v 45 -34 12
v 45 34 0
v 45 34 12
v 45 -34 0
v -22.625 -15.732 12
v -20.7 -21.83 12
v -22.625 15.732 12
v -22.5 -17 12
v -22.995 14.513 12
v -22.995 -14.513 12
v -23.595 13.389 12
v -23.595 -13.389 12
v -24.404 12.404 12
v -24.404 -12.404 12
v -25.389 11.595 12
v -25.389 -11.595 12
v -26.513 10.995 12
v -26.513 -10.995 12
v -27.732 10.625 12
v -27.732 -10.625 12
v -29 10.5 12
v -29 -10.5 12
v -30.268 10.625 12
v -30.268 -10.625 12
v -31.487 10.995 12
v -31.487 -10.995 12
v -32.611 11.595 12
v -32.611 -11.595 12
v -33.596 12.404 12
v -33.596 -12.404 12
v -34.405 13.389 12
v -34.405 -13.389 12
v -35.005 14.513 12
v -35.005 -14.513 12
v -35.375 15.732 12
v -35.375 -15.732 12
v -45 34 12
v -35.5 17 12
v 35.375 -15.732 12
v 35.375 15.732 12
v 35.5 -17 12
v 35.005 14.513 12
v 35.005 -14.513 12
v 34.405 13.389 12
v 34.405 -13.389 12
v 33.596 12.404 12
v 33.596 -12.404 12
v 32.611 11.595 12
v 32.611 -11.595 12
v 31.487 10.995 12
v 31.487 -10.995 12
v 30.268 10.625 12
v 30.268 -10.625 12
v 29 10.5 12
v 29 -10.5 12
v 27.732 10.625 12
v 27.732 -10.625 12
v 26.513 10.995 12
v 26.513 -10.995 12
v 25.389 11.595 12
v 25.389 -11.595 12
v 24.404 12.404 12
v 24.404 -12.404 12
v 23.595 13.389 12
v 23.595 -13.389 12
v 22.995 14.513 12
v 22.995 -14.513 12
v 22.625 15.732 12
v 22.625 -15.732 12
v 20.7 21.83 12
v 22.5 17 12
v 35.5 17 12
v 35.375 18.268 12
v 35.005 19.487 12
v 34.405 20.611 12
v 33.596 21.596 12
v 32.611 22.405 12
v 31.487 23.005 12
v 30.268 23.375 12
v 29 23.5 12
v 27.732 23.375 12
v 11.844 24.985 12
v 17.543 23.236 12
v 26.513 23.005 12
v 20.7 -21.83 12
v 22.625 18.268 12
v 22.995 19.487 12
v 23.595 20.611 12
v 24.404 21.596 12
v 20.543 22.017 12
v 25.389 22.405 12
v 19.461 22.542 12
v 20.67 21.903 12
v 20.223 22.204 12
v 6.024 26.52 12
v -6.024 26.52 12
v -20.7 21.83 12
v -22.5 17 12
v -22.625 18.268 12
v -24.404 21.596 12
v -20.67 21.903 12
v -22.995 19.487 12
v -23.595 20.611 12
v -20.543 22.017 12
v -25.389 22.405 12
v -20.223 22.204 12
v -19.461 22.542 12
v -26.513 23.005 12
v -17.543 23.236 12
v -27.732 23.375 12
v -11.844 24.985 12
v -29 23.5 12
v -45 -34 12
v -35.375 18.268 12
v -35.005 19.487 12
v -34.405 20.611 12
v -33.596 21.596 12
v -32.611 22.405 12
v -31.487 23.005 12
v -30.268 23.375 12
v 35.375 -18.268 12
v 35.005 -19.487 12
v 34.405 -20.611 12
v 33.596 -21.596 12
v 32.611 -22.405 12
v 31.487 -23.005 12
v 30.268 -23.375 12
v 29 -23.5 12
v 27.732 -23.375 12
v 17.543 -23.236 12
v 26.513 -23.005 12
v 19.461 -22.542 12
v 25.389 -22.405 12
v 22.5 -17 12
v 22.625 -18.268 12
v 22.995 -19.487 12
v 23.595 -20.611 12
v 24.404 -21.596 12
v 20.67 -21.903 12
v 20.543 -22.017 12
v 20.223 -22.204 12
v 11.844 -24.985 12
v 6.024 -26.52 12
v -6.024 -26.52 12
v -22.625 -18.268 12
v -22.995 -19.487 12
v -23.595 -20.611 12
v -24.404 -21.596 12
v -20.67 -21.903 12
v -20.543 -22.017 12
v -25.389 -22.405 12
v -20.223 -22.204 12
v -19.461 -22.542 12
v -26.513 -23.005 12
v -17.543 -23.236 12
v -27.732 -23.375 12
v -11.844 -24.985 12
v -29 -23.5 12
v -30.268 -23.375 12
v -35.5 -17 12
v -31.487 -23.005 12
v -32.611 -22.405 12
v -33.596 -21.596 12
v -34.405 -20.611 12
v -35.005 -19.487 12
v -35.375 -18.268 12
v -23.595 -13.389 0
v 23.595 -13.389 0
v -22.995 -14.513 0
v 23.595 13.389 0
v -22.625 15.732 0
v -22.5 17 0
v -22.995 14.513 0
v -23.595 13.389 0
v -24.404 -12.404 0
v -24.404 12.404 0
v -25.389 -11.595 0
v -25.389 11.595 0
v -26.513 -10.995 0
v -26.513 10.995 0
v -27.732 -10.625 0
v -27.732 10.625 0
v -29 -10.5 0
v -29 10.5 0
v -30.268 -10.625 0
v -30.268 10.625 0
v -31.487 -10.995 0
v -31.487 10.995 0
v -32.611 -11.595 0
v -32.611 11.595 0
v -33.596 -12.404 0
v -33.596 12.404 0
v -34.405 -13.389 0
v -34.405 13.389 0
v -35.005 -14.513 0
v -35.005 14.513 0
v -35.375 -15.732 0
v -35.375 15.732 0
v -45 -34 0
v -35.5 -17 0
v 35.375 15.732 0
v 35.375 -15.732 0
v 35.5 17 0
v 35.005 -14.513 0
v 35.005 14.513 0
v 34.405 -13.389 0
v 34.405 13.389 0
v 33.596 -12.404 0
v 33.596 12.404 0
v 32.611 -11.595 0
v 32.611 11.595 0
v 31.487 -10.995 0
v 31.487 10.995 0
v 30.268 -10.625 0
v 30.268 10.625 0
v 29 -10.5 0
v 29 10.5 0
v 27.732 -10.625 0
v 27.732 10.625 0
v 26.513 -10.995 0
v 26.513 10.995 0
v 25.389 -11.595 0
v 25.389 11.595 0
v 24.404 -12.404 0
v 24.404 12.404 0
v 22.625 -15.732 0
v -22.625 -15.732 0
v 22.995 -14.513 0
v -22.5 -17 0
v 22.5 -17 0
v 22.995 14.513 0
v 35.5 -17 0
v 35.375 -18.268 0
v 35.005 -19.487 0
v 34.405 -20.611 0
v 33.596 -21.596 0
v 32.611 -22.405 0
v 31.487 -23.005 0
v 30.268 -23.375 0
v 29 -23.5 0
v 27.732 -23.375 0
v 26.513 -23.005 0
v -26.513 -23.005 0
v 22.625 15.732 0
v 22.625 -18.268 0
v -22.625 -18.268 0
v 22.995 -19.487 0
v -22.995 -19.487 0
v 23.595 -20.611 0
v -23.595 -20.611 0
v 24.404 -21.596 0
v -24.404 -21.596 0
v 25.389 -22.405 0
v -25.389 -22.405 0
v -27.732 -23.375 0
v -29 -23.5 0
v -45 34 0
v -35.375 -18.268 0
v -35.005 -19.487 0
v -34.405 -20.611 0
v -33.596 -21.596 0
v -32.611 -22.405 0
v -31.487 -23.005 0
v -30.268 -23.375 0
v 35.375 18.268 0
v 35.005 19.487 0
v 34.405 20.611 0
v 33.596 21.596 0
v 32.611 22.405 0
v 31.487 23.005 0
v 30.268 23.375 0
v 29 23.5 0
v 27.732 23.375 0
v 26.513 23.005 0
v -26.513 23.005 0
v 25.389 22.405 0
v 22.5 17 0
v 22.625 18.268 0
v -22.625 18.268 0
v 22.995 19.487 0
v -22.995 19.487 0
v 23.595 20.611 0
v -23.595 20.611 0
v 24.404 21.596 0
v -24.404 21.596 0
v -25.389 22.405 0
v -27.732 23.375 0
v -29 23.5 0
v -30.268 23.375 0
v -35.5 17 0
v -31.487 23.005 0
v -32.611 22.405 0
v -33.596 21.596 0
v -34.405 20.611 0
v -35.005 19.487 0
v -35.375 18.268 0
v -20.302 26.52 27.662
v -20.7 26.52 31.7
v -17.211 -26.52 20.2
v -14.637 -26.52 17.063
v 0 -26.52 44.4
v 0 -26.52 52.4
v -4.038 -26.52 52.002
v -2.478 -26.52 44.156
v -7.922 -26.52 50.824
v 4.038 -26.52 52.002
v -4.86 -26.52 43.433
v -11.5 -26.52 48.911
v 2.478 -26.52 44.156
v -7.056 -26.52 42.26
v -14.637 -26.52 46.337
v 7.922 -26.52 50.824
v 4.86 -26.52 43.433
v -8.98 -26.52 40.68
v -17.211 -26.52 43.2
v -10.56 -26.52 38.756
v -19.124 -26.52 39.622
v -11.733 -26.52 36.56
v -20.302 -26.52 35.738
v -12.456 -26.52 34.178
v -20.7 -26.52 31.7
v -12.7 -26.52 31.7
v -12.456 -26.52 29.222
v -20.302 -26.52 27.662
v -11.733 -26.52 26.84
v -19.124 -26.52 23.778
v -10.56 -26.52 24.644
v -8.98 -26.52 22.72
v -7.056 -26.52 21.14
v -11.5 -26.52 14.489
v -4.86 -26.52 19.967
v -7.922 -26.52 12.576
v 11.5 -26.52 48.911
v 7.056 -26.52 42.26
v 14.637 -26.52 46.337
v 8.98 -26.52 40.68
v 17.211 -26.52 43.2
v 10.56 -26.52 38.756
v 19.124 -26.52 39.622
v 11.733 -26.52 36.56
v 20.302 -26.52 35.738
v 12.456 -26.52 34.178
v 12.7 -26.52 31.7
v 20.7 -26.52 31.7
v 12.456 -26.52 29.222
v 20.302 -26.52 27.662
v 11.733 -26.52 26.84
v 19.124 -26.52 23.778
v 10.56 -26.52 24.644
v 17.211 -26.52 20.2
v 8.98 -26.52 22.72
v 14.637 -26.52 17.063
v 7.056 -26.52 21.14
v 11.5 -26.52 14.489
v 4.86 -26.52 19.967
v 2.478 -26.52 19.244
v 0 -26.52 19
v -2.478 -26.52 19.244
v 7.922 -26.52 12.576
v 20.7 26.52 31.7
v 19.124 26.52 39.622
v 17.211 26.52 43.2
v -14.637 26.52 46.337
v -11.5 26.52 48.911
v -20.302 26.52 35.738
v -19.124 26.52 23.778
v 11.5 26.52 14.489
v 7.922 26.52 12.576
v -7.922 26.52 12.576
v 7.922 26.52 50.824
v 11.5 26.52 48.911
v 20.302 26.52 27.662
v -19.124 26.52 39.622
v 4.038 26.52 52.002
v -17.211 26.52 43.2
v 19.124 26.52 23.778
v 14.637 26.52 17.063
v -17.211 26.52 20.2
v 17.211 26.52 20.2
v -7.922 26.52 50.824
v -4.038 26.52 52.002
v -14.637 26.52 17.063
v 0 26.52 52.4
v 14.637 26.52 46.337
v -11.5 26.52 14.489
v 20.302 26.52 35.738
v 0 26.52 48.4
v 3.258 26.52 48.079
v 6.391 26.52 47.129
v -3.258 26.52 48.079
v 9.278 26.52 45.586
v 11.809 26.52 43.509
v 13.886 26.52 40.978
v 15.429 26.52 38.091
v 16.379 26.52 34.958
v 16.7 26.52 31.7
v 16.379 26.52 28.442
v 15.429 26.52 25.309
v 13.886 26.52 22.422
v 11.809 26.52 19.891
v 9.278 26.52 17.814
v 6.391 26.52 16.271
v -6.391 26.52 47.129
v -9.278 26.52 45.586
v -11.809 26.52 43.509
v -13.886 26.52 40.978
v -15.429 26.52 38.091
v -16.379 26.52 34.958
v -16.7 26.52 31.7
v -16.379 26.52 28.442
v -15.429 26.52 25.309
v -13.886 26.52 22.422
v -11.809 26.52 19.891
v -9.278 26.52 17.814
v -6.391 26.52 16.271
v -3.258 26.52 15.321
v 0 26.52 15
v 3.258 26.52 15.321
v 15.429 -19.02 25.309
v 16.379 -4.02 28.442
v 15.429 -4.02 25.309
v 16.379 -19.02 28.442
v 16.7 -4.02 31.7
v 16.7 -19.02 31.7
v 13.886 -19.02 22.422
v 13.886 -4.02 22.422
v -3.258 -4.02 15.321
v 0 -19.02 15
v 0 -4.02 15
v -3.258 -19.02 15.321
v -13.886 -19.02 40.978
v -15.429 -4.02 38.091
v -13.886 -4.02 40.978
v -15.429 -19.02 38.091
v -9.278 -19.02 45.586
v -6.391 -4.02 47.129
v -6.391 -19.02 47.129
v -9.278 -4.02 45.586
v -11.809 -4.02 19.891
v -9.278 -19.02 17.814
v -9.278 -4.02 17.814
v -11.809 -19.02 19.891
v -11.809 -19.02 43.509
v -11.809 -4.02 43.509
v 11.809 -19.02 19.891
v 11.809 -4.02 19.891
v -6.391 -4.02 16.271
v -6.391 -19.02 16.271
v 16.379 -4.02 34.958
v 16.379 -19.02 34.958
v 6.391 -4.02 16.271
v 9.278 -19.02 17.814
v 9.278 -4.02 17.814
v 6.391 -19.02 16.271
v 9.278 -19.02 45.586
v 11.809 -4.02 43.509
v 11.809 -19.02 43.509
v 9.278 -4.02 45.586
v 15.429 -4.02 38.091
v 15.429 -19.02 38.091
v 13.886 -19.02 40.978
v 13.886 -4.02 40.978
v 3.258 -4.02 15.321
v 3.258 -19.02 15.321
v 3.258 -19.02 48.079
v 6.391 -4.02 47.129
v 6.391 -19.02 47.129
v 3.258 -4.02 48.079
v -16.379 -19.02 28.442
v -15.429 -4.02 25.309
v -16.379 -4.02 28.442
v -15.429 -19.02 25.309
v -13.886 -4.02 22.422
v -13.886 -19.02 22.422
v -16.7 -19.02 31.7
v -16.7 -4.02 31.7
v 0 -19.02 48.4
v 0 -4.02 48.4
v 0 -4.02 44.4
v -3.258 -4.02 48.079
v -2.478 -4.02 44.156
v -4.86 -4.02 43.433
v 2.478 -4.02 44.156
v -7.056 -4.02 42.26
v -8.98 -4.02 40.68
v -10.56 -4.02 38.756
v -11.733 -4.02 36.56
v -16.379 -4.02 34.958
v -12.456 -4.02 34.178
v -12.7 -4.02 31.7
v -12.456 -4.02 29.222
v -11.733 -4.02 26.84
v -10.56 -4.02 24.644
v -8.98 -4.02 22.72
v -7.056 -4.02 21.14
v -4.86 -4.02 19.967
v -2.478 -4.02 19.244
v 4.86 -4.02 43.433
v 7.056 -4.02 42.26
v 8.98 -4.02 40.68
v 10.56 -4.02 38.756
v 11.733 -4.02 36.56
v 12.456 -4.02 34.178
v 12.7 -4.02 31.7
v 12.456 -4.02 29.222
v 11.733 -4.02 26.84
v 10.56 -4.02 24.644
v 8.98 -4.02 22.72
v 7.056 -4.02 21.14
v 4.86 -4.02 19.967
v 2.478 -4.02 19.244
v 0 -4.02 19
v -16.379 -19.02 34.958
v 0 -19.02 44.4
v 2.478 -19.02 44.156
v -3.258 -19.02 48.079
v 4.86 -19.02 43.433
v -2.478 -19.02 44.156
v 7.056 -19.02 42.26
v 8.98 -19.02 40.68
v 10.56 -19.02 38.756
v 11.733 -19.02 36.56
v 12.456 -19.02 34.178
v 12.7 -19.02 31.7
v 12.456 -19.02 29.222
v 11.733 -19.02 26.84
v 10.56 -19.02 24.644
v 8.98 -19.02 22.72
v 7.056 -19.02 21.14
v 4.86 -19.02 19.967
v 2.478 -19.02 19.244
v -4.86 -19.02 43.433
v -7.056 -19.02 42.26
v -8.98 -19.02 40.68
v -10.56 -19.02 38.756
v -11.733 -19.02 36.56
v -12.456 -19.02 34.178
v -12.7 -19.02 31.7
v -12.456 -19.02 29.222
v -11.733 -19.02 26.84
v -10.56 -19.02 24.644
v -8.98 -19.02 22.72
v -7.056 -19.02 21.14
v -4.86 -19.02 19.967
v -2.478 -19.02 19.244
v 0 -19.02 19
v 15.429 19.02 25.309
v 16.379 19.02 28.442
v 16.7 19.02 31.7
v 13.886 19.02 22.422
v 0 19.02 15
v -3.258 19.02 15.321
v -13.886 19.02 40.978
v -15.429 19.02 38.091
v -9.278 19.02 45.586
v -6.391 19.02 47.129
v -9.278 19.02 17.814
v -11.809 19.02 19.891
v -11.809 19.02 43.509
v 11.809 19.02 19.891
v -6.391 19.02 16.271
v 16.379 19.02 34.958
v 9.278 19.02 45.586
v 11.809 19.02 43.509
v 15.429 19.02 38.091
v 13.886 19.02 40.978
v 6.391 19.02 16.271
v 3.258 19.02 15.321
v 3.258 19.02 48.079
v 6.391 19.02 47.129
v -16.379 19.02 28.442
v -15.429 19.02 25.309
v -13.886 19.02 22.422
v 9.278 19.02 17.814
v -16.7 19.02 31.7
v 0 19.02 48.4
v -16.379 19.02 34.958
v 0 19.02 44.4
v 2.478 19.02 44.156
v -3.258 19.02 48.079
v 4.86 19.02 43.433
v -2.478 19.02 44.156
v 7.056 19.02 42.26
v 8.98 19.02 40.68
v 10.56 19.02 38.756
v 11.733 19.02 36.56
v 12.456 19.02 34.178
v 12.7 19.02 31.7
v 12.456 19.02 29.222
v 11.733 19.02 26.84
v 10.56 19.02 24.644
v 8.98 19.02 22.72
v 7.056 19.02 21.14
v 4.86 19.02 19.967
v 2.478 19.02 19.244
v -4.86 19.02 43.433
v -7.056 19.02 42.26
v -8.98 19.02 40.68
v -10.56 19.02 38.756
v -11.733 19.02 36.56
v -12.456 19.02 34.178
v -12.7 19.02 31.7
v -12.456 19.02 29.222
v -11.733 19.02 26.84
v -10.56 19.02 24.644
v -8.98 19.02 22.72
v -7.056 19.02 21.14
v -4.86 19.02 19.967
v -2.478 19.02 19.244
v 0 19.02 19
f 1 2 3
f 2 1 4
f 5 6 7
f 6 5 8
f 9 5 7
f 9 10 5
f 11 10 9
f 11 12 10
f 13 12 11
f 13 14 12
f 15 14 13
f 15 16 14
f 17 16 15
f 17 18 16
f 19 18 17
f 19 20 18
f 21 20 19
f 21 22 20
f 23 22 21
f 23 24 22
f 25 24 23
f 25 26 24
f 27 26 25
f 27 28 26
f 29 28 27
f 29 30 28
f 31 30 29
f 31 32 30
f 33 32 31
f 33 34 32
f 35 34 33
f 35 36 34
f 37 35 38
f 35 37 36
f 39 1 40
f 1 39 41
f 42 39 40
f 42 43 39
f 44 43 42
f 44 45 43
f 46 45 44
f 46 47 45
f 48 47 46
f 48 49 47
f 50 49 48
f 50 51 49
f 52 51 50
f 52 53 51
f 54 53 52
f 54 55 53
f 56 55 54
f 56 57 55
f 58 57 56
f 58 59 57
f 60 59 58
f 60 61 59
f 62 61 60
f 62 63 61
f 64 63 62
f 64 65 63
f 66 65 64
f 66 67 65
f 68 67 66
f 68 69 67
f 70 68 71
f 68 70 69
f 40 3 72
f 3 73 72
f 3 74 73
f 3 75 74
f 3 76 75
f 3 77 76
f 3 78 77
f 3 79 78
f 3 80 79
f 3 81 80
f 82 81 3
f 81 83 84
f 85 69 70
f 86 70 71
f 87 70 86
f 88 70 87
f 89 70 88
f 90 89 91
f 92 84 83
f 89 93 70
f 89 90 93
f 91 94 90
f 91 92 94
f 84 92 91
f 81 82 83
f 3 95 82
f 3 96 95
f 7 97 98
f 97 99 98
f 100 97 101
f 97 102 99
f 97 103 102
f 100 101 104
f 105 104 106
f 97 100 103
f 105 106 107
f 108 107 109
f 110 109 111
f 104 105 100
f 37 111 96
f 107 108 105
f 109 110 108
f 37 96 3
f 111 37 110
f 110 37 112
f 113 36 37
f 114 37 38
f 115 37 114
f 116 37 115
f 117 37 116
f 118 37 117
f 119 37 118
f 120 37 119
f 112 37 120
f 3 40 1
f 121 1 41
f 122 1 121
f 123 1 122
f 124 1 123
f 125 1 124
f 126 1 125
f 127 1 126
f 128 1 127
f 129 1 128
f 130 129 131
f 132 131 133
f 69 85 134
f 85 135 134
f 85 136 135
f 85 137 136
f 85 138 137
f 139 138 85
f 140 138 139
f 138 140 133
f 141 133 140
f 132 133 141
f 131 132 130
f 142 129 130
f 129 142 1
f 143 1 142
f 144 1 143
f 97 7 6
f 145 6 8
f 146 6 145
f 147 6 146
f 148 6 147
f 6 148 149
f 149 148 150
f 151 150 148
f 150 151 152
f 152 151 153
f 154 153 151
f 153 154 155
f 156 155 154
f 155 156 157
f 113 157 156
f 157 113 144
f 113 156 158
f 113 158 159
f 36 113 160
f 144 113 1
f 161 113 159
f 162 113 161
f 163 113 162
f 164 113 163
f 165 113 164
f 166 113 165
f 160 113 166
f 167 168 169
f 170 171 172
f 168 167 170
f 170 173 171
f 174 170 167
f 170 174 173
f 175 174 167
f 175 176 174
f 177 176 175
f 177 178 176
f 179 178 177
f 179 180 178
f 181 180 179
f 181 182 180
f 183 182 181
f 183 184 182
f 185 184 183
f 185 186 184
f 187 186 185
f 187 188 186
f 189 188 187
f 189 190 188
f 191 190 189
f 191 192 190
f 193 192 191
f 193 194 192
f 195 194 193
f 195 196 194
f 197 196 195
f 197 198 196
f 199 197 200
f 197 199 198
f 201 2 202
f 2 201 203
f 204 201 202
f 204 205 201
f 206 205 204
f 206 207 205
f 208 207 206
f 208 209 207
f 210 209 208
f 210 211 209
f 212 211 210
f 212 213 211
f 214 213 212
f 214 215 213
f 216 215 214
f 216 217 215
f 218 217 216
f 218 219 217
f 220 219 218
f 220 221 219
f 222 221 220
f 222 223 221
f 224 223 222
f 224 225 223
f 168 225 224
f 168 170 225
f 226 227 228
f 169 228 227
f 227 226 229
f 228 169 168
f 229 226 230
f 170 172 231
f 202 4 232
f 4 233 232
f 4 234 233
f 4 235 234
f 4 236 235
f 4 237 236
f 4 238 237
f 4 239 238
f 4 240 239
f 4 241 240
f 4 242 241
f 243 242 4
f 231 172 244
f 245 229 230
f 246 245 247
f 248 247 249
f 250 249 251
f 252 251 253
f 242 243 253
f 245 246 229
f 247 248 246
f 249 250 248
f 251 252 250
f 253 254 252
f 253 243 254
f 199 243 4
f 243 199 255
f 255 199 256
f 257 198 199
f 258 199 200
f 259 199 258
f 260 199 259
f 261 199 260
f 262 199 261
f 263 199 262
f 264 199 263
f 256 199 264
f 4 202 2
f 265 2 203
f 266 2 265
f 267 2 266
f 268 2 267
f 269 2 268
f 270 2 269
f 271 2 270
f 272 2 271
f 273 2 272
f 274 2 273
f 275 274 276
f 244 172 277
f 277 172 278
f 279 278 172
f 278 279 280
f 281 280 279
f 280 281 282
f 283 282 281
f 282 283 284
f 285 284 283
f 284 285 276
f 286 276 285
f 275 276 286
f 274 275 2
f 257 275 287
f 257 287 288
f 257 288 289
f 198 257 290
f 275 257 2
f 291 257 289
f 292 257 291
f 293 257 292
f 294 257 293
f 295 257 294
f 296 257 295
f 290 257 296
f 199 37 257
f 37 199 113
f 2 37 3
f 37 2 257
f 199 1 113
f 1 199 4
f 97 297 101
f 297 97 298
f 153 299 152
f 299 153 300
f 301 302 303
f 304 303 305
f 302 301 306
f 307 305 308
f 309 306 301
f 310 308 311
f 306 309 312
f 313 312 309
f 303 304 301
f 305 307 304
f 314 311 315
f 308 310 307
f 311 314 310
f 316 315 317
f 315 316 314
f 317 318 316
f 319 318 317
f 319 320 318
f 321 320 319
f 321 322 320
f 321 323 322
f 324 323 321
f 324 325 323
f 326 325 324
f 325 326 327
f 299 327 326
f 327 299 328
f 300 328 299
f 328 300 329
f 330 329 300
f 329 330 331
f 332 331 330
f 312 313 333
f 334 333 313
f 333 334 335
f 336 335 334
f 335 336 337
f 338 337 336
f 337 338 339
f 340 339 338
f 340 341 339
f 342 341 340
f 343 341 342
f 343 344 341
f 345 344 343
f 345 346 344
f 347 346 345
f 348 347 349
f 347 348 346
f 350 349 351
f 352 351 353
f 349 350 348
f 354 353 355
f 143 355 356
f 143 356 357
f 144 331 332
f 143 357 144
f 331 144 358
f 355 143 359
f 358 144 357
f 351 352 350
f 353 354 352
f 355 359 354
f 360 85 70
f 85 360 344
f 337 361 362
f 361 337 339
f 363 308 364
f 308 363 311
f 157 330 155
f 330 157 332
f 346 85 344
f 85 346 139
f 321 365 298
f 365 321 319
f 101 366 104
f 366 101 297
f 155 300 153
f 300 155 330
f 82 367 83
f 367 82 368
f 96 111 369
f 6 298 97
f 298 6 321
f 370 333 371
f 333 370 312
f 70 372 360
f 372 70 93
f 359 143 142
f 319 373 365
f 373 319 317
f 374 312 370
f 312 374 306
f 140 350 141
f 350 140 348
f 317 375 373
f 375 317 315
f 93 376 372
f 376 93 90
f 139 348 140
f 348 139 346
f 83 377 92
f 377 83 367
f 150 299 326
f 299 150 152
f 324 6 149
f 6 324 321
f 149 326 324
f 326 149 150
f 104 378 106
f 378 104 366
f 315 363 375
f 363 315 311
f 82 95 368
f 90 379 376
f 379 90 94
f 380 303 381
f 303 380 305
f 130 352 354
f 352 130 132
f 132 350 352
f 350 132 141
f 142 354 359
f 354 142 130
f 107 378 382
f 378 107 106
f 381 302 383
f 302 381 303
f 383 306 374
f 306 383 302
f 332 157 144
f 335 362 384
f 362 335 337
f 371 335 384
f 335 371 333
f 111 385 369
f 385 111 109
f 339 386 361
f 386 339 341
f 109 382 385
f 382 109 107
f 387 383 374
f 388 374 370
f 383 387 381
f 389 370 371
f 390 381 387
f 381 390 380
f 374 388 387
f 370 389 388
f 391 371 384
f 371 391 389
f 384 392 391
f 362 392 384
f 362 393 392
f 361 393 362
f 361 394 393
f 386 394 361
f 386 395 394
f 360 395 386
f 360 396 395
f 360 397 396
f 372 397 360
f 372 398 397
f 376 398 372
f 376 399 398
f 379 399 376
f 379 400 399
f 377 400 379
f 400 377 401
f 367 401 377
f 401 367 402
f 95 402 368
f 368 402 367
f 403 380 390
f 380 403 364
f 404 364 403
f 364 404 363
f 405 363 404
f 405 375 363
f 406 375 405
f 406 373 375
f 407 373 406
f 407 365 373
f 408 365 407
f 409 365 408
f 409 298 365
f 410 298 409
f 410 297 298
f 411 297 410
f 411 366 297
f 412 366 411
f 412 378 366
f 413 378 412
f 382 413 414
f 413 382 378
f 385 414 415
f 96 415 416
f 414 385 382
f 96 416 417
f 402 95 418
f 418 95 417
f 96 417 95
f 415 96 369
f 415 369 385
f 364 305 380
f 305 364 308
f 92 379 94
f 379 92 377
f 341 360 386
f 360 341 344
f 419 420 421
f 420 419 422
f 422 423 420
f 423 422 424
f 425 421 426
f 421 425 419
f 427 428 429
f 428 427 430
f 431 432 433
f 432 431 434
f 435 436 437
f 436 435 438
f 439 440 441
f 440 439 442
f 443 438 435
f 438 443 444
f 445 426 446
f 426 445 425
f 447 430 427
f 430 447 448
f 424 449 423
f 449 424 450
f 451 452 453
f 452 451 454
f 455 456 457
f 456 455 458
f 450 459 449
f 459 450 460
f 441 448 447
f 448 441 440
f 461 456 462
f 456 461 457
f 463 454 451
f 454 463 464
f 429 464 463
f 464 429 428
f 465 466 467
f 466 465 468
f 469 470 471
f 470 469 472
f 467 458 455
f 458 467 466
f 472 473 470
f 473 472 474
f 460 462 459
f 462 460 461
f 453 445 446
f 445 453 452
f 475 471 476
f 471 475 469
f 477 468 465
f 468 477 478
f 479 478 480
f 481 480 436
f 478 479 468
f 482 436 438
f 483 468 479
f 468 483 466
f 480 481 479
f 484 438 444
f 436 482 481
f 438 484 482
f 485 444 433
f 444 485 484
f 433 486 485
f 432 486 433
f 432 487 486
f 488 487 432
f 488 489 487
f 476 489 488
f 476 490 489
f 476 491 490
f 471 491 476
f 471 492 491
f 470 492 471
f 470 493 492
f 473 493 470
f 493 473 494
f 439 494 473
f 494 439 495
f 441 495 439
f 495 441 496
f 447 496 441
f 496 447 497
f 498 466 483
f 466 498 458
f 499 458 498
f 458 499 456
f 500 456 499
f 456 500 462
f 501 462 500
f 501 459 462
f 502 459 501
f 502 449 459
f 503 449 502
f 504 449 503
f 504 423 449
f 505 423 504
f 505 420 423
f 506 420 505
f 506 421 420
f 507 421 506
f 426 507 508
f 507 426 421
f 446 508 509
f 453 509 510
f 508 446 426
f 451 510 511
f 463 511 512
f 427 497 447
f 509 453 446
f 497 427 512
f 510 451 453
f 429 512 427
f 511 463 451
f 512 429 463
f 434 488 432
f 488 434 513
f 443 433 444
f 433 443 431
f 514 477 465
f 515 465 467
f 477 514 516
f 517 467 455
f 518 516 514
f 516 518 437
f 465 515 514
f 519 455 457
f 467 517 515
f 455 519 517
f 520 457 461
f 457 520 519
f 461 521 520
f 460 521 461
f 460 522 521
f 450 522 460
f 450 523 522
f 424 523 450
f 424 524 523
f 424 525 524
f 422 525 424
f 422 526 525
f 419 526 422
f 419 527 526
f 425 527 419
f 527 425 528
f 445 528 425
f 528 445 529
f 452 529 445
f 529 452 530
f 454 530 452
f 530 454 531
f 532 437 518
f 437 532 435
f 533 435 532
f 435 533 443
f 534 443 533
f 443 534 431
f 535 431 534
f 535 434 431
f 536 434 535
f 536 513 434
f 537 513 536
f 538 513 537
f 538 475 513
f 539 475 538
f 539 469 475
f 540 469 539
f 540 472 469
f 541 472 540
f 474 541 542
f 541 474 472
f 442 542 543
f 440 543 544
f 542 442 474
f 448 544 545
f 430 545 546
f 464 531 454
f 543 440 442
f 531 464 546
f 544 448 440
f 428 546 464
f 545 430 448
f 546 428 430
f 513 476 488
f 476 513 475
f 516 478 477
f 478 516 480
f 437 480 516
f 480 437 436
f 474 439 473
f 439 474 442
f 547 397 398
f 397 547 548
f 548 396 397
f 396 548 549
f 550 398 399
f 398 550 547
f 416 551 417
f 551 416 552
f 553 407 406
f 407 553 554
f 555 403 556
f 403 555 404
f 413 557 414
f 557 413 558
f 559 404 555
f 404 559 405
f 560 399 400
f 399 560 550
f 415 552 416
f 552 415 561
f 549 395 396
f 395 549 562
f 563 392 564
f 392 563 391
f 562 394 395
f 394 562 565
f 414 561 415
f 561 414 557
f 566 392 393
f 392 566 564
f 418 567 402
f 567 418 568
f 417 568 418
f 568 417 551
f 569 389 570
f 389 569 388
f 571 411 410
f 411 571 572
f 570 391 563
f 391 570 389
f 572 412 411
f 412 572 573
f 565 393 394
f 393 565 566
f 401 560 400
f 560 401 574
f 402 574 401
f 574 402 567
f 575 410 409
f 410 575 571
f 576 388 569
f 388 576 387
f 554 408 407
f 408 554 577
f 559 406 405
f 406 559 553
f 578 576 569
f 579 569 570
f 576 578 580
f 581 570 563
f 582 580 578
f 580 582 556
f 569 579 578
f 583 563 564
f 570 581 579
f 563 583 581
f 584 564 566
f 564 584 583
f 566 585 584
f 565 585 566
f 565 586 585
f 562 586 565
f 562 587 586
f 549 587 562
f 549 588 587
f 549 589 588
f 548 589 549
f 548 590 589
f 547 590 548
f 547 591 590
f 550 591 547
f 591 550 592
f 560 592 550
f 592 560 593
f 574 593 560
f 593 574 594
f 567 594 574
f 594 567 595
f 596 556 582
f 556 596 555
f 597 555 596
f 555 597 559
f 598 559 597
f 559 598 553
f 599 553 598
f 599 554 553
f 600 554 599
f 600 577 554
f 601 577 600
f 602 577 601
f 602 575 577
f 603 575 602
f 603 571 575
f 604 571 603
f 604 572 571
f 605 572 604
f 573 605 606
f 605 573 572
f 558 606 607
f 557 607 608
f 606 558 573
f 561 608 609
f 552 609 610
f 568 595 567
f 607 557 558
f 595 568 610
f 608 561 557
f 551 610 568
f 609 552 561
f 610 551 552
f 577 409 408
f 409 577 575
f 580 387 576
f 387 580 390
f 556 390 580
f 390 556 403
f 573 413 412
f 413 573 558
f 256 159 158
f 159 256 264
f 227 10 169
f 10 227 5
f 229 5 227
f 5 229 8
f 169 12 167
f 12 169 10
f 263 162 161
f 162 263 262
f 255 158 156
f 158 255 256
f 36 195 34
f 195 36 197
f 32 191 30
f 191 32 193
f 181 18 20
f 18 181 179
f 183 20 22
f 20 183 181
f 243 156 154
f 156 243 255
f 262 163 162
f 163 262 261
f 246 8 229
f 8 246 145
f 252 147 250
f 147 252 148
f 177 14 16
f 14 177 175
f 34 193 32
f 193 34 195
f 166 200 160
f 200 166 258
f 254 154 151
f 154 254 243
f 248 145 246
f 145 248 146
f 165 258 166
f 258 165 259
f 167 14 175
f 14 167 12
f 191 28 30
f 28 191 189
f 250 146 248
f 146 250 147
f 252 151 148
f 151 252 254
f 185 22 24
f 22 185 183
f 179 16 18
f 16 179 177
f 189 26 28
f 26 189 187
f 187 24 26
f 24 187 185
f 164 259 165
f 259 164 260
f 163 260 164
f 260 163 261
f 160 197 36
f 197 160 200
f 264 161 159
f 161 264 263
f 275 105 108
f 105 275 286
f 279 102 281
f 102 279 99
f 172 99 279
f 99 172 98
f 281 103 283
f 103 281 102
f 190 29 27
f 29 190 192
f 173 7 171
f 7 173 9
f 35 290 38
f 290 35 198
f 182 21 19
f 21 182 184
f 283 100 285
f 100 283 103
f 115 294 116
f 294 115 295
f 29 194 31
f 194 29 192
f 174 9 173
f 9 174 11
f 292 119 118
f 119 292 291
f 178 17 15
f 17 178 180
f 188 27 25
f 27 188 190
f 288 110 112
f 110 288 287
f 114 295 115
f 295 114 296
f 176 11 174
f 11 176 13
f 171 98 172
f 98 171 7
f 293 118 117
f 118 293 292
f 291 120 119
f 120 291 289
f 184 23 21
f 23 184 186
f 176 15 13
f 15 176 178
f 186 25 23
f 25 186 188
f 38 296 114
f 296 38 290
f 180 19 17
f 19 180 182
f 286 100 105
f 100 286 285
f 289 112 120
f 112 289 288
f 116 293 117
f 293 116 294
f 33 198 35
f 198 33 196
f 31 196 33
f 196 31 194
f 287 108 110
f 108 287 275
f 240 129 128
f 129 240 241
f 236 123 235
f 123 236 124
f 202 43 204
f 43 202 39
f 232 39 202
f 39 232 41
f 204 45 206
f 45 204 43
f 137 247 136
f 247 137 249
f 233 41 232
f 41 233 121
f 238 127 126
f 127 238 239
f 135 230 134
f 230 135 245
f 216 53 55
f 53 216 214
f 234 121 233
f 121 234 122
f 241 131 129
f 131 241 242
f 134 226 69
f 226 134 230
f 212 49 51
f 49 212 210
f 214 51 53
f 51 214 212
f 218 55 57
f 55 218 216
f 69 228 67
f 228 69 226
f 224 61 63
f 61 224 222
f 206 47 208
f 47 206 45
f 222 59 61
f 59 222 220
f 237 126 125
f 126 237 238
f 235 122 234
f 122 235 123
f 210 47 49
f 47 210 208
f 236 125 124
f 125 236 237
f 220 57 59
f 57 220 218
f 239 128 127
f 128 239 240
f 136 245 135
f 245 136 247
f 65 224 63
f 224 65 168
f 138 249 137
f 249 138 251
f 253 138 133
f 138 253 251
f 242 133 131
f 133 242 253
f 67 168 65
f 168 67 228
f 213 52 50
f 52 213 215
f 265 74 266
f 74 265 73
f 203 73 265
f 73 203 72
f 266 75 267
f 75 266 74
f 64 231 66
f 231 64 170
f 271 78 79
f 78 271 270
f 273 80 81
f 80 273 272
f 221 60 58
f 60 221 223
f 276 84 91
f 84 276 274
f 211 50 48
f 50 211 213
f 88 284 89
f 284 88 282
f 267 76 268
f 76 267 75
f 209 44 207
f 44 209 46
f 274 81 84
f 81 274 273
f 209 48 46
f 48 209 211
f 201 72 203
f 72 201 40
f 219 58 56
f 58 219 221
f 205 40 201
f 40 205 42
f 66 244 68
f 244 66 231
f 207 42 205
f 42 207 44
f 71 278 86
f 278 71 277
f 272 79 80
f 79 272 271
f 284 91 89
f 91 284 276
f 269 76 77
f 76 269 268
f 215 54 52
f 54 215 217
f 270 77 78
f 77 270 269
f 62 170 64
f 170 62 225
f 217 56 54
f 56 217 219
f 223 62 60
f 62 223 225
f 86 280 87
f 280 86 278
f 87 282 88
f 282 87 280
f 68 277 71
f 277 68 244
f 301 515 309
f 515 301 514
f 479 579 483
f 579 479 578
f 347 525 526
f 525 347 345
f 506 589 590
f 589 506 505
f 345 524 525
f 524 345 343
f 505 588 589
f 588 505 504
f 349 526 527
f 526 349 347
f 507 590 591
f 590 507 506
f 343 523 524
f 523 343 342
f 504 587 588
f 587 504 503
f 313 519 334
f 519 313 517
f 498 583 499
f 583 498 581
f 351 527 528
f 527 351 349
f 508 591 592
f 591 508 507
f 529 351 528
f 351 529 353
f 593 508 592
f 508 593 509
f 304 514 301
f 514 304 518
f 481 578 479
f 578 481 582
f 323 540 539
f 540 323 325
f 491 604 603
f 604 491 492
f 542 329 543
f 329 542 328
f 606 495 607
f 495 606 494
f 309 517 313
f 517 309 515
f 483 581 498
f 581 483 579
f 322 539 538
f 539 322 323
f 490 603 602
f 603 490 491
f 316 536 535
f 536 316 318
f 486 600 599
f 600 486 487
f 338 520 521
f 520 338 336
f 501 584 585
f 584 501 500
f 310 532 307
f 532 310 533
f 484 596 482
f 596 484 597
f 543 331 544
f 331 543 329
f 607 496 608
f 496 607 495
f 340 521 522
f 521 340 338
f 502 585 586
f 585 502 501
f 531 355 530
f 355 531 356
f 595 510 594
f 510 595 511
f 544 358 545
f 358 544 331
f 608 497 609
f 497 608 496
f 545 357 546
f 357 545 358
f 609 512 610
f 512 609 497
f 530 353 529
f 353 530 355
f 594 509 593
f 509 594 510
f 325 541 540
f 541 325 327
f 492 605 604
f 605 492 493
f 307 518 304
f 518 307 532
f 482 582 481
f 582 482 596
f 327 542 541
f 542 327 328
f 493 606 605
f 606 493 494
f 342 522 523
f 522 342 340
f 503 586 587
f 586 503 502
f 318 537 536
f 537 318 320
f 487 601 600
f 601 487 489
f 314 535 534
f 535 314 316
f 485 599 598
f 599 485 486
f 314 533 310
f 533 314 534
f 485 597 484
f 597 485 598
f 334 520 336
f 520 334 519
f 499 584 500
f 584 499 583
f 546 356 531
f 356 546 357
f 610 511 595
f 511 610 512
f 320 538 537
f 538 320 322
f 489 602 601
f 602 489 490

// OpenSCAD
$fn = 32;

// ----------------------------------------------------------------------
// Bearing block: 90 x 68 mm base, 25.4 mm bore at 31.7 mm
// ----------------------------------------------------------------------

// --- parameters (mm) ---
base_w = 90;              // base width
base_d = 68;              // base depth
base_t = 12;              // base thickness
bore_d = 25.4;            // shaft / bearing bore
house_r = 20.7;           // housing outer radius
house_len = 53.04;        // housing length along the shaft
foot_w = 41.4;            // foot width under the housing
foot_len = 43.04;         // foot length along the shaft
axis_z = 31.7;            // bore axis height above the base
holes_d = 13;             // mounting holes
hole_x = 29;              // mounting hole spacing
seat_d = 10;              // bearing seat depth
seat_wall = 4;            // seat wall thickness

difference() {
  union() {
    /* base plate with its underside on z = 0 */
    translate([0, 0, base_t / 2]) cube([base_w, base_d, base_t], center = true);
    /* hull foot: a straight web blending into the round housing */
    hull() {
      translate([0, 0, base_t - 0.5]) cube([foot_w, foot_len, 1.6], center = true);
      translate([0, 0, axis_z]) rotate([-90, 0, 0]) cylinder(h = house_len, d = 2 * house_r, center = true);
    }
  }
  /* bore through the housing, 2.5 mm clear on both sides */
  translate([0, 0, axis_z]) rotate([-90, 0, 0]) cylinder(h = house_len + 5, d = bore_d, center = true);
  /* bearing seats, recessed into both ends of the housing */
  for (sy = [-1, 1]) {
    translate([0, sy * (house_len / 2 - seat_d + 2.5), axis_z]) rotate([-90, 0, 0]) cylinder(h = seat_d + 5, d = bore_d + 2 * seat_wall);
  }
  /* mounting holes through the base plate */
  for (hx = [-29, 29]) {
    for (hy = [-17, 17]) {
      translate([hx, hy, -2.5]) cylinder(h = base_t + 5, d = holes_d);
    }
  }
}
